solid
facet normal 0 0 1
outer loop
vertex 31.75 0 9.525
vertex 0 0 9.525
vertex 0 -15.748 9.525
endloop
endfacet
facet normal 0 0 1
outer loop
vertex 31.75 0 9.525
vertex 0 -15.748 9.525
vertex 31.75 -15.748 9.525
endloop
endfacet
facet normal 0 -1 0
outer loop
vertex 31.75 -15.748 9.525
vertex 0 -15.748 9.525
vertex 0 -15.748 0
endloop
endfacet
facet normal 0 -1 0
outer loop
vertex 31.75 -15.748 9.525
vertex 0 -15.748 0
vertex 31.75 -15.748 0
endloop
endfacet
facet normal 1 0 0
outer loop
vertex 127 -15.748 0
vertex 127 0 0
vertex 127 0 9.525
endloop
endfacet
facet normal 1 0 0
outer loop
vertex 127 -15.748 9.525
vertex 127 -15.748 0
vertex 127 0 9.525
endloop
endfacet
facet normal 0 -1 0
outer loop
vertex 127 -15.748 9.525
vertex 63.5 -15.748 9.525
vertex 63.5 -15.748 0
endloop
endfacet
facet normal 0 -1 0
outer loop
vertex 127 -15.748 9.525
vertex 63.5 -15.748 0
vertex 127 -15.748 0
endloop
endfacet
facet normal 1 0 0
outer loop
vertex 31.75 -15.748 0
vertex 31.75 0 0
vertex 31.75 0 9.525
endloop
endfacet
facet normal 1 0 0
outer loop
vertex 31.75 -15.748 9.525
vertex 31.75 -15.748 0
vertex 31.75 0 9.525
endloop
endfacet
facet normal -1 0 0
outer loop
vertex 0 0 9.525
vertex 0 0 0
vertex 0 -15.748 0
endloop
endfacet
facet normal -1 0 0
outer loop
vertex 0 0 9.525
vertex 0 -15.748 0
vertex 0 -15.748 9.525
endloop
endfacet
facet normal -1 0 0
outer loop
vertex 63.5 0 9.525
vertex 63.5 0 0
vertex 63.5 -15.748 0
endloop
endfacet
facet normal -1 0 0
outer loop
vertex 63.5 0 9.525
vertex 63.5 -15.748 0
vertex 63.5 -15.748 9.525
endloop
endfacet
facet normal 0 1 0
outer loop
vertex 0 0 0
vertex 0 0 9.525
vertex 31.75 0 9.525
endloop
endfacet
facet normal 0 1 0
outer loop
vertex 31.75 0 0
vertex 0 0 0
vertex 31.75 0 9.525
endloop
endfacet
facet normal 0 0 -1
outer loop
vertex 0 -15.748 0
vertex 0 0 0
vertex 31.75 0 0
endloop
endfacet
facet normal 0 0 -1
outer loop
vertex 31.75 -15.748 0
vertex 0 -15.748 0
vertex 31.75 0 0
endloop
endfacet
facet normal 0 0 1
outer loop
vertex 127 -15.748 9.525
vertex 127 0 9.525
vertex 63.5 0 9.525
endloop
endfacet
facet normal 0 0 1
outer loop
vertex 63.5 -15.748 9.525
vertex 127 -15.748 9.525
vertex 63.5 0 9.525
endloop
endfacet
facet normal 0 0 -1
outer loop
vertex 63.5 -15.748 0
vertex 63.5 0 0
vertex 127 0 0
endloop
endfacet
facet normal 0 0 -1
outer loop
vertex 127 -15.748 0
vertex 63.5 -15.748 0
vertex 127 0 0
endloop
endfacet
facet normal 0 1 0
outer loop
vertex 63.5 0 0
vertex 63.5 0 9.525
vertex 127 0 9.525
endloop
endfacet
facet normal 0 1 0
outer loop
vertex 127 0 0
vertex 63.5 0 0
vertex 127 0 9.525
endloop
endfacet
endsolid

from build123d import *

# Parameters (mm, degrees)
F0_W     = 31.75
F0_H     = 9.525
F1_DEPTH = 15.748


with BuildPart() as f1:
    # F0 (on Front) → F1 (new body)
    with BuildSketch(Plane.XZ):
        with Locations((15.875, 4.7625)):
            Rectangle(F0_W, F0_H)
    extrude(amount=F1_DEPTH)


with BuildPart() as f1b:
    # F0 (on Front) → F1, piece 2 (new body)
    with BuildSketch(Plane.XZ):
        with Locations((79.375, 4.7625)):
            Rectangle(F0_W, F0_H)
        with Locations((111.125, 4.7625)):
            Rectangle(F0_W, F0_H)
    extrude(amount=F1_DEPTH)


solid = Compound([f1.part, f1b.part])
